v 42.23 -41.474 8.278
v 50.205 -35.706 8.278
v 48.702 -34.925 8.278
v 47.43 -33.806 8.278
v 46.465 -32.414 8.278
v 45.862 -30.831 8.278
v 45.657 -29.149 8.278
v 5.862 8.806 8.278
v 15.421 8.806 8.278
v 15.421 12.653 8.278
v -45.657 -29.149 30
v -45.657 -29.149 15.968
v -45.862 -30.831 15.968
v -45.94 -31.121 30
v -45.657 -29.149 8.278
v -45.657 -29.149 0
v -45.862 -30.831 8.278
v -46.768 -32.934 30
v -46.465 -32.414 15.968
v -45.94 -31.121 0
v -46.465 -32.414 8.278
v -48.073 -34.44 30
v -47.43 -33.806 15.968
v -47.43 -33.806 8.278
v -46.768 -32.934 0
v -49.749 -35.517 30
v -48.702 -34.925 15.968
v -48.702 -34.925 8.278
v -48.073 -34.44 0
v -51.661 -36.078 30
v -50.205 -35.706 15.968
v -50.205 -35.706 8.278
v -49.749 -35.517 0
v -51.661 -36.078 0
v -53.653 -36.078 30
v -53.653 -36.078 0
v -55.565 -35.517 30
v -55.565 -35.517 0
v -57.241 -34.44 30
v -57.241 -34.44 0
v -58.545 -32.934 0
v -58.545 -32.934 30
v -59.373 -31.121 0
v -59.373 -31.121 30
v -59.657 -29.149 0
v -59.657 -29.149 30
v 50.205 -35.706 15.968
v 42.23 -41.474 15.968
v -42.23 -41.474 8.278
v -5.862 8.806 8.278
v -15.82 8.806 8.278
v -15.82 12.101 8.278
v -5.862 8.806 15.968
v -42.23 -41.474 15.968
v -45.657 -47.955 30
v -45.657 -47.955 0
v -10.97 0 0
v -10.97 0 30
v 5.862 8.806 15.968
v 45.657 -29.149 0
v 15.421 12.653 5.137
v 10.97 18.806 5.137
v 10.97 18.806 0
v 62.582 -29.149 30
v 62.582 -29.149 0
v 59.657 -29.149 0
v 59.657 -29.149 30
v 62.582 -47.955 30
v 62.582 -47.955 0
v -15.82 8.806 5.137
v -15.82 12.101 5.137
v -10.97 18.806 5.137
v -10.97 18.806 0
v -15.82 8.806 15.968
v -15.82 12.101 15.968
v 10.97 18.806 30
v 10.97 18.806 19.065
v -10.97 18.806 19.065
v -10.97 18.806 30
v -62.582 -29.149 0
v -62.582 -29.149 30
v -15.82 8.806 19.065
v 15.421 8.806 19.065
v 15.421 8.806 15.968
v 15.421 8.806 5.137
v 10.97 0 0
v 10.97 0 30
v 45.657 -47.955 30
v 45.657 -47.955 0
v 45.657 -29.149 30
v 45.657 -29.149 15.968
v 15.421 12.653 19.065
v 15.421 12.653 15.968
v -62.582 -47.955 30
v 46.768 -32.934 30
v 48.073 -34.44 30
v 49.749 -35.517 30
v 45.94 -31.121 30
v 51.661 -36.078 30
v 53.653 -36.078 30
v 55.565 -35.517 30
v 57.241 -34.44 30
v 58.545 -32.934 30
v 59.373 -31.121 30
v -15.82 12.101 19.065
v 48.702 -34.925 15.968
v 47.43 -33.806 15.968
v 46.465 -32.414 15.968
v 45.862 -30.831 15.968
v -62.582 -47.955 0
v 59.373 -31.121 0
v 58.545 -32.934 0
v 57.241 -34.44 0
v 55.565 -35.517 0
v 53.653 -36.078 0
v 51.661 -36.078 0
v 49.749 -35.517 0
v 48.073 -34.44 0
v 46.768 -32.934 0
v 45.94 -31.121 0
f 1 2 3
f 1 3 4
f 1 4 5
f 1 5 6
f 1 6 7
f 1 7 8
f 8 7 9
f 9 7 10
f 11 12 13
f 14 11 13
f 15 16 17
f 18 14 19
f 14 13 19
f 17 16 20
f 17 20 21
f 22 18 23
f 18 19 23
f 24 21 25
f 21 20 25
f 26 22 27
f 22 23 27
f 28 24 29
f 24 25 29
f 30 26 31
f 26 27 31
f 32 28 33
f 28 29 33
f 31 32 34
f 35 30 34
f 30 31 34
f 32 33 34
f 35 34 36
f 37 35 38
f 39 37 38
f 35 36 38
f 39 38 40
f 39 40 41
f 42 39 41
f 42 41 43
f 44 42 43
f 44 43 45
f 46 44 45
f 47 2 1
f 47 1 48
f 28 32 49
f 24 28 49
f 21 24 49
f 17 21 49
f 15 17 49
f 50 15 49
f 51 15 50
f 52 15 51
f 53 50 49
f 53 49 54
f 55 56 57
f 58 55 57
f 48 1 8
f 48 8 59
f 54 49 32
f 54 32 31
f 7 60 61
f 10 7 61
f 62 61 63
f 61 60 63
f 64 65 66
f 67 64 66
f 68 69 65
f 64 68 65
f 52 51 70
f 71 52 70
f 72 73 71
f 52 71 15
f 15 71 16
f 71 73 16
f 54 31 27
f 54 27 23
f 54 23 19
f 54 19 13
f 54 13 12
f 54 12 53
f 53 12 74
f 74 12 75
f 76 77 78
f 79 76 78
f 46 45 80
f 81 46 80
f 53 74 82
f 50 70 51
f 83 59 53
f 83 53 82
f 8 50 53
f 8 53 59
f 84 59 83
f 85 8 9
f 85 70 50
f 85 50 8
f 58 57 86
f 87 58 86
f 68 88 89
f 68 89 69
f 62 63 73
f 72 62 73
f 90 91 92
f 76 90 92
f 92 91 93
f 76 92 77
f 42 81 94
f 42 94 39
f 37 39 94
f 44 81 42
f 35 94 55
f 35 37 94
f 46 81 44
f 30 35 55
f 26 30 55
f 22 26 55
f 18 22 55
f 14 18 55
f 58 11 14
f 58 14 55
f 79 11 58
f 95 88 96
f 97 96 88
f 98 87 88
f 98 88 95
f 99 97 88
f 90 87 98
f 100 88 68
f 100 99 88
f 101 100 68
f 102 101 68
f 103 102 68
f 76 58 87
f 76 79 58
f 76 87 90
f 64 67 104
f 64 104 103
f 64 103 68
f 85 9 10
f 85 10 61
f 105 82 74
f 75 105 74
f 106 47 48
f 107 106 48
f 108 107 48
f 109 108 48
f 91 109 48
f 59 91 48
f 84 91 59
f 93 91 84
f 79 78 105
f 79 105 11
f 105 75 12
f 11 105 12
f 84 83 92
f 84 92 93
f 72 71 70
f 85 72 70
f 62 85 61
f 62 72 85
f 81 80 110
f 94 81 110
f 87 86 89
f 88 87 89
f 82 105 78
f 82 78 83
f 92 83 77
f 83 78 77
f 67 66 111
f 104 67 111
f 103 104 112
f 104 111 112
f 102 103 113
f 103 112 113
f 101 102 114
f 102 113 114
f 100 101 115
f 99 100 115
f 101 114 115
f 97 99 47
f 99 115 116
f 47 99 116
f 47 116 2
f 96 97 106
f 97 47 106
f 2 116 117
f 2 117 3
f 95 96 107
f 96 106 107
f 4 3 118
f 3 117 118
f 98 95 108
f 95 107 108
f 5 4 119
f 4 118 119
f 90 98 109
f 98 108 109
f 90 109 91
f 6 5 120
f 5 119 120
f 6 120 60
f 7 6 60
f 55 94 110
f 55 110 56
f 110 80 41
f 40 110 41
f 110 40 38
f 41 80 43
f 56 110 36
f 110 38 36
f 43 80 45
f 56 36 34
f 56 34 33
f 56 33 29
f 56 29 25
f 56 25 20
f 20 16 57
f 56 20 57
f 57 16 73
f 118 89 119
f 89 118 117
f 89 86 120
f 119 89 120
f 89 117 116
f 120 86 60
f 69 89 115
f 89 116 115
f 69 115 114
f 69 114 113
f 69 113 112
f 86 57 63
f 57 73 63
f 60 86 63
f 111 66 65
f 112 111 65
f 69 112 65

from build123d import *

# Parameters (mm, degrees)
BOSS_EXTRUDE1_DEPTH = 30
SKETCH3_W           = 31.24049206
SKETCH3_H           = 13.927985749
CUT_EXTRUDE1_DEPTH  = 10
SKETCH4_W           = 7.689934576
SKETCH4_H           = 62.184409798
CUT_EXTRUDE2_DEPTH  = 10


with BuildPart() as part:
    # Sketch2 → Boss-Extrude1 (new body)
    with BuildSketch(Plane.XY):
        with BuildLine():
            Line((-10.970149254, 0), (0, 0))
            Line((0, 0), (0, 18.805970149))
            Line((0, 18.805970149), (-10.970149254, 18.805970149))
            Line((-10.970149254, 18.805970149), (-45.656716418, -29.149253731))
            ThreePointArc((-45.656716418, -29.149253731), (-52.656716418, -36.149253731), (-59.656716418, -29.149253731))
            Line((-59.656716418, -29.149253731), (-62.582089552, -29.149253731))
            Line((-62.582089552, -29.149253731), (-62.582089552, -47.955223881))
            Line((-62.582089552, -47.955223881), (-45.656716418, -47.955223881))
            Line((-45.656716418, -47.955223881), (-10.970149254, 0))
        make_face()
        with BuildLine():
            Line((0, 0), (10.970149254, 0))
            Line((10.970149254, 0), (45.656716418, -47.955223881))
            Line((45.656716418, -47.955223881), (62.582089552, -47.955223881))
            Line((62.582089552, -47.955223881), (62.582089552, -29.149253731))
            Line((62.582089552, -29.149253731), (59.656716418, -29.149253731))
            ThreePointArc((59.656716418, -29.149253731), (52.656716418, -36.149253731), (45.656716418, -29.149253731))
            Line((45.656716418, -29.149253731), (10.970149254, 18.805970149))
            Line((10.970149254, 18.805970149), (0, 18.805970149))
            Line((0, 18.805970149), (0, 0))
        make_face()
    extrude(amount=BOSS_EXTRUDE1_DEPTH)

    # Sketch3 → Cut-Extrude1 (cut)
    with BuildSketch(Plane(origin=(0, 18.805970149, 0), x_dir=(1, 0, 0), z_dir=(0, 1, 0))):
        with Locations((-0.199336915, -12.101360071)):
            Rectangle(SKETCH3_W, SKETCH3_H)
    extrude(amount=-CUT_EXTRUDE1_DEPTH, mode=Mode.SUBTRACT)

    # Sketch4 → Cut-Extrude2 (cut)
    with BuildSketch(Plane(origin=(-16.132519574, 11.668837688, 0), x_dir=(0, 0, 1), z_dir=(-0.8102600819579188, 0.5860704732244638, 0))):
        with Locations((12.122562235, -27.26241609)):
            Rectangle(SKETCH4_W, SKETCH4_H)
    cut_extrude2 = extrude(amount=-CUT_EXTRUDE2_DEPTH, mode=Mode.SUBTRACT)

    # Mirror1: Cut-Extrude2 across plane
    add(cut_extrude2.mirror(Plane(origin=(0, 0, 0), x_dir=(0, 0, 1), z_dir=(1, 0, 0))), mode=Mode.SUBTRACT)


solid = part.part
